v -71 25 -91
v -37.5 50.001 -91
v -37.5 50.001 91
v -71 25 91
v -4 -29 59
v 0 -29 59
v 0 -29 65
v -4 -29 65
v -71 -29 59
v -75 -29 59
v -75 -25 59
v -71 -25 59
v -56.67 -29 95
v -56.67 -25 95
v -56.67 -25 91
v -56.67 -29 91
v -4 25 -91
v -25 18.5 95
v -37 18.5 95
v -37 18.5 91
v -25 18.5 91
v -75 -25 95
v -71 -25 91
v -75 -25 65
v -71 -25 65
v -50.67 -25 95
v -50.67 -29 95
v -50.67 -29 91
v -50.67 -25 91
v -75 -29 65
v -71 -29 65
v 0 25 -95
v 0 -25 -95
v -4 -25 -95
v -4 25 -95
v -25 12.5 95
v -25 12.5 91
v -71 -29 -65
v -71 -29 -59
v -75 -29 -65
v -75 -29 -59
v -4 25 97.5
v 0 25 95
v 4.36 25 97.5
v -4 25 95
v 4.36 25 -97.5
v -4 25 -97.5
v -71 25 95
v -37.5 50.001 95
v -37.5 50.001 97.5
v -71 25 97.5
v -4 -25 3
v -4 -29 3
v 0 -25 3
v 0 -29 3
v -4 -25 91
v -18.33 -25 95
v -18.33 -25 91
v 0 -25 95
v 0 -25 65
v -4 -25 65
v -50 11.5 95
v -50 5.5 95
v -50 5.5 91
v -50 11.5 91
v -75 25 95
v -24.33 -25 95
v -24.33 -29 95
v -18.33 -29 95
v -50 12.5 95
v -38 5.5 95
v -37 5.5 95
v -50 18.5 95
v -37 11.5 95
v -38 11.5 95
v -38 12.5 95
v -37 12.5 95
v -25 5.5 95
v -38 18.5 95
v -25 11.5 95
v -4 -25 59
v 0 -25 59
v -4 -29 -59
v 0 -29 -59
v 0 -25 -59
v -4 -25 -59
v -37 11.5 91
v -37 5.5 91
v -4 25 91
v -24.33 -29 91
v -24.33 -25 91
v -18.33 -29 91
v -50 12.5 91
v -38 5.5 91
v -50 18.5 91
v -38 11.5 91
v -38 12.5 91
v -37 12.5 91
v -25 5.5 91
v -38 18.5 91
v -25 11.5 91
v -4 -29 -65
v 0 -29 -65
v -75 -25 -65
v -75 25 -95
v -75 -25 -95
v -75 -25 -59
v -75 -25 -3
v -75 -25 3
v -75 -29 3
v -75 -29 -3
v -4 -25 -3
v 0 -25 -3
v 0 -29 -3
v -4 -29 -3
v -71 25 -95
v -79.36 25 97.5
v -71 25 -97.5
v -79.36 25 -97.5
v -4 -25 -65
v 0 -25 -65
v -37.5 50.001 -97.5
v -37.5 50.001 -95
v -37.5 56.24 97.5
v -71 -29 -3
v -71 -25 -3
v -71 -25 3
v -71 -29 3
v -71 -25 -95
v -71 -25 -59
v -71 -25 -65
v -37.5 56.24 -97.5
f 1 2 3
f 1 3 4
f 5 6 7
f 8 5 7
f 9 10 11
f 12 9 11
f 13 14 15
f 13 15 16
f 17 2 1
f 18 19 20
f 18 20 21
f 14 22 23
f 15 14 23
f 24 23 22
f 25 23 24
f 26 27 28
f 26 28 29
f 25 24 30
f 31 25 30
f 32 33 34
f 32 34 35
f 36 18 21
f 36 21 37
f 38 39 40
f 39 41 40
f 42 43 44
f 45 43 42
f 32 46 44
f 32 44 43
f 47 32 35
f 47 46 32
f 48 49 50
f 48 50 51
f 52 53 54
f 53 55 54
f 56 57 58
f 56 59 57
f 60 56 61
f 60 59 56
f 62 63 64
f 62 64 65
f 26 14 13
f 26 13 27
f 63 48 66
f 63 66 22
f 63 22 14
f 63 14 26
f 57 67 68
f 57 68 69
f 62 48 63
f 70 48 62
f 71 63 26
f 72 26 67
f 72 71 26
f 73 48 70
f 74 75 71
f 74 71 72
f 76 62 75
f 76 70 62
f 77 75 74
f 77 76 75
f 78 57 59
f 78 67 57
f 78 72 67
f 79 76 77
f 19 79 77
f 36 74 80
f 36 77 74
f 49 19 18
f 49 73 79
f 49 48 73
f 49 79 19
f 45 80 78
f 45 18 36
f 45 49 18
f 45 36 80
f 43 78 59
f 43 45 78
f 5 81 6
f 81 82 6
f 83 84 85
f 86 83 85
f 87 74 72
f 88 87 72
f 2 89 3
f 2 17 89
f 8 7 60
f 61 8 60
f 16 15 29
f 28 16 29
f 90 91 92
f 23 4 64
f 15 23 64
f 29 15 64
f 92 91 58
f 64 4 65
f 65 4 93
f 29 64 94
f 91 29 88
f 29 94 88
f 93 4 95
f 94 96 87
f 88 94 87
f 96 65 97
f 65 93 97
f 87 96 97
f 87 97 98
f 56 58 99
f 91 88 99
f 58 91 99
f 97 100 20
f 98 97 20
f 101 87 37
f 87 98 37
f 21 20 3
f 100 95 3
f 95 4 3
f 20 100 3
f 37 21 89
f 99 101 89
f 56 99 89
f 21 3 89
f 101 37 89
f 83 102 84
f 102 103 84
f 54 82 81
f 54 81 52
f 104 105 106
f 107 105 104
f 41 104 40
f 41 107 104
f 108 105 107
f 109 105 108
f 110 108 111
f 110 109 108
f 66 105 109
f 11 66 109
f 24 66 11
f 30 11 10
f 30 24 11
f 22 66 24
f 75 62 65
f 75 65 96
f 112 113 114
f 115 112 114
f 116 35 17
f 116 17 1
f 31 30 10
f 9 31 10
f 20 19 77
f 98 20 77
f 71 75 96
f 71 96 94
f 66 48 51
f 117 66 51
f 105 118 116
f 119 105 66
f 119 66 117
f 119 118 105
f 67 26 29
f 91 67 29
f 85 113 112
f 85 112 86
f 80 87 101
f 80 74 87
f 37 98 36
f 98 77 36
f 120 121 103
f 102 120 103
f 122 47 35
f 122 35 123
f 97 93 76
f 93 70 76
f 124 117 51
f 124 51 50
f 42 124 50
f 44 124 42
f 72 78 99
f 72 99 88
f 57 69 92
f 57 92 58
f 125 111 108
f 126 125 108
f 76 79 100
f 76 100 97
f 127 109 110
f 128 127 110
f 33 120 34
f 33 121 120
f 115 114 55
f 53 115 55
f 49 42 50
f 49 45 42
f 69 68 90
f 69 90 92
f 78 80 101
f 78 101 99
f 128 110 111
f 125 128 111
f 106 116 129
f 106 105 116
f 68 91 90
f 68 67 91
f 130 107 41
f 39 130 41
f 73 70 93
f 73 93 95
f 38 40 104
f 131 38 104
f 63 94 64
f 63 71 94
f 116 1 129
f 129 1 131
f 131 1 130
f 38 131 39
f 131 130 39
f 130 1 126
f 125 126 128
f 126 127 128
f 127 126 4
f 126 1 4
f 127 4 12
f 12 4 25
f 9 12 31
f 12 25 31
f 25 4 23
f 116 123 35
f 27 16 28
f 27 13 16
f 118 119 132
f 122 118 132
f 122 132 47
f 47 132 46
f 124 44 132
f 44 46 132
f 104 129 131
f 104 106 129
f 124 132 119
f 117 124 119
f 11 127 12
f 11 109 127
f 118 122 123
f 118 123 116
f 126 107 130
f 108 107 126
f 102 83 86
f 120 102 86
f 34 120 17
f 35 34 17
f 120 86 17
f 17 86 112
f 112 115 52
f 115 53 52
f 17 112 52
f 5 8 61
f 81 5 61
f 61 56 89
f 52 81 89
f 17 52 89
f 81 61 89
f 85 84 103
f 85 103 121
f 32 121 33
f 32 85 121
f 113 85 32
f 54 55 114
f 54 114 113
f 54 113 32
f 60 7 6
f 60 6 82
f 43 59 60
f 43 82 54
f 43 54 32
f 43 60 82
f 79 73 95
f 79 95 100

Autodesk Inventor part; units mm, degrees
ref_plane "XZ Plane" through (0, 0, 0) normal (0, 1, 0) x (-1, 0, 0)
ref_plane "XY Plane" through (0, 0, 0) normal (0, 0, 1) x (1, 0, 0)
sketch "Náčrt1" plane through (0, 0, 0) normal (1, 0, 0) x (0, 1, 0)
  line L0 (25, 95) -> (-25, 95)
  line L1 (-25, 95) -> (-25, -95)
  line L2 (-25, -95) -> (25, -95)
  line L3 (25, -95) -> (25, 95)
  line L4 (25, 95) -> (-25, -95) construction
  line L5 (-25, 95) -> (25, -95) construction
  line L6 (-25, -3) -> (-29, -3)
  line L7 (-29, -3) -> (-29, 3)
  line L8 (-29, 3) -> (-25, 3)
  line L9 (-25, 3) -> (-25, -3)
  line L10 (-25, -65) -> (-29, -65)
  line L11 (-29, -65) -> (-29, -59)
  line L12 (-29, -59) -> (-25, -59)
  line L13 (-25, -59) -> (-25, -65)
  line L14 (-25, 59) -> (-29, 59)
  line L15 (-29, 59) -> (-29, 65)
  line L16 (-29, 65) -> (-25, 65)
  line L17 (-25, 65) -> (-25, 59)
  line L18 (7.5, 95) -> (7.5, 85)
  line L19 (7.5, 85) -> (17.5, 85)
  line L20 (17.5, 85) -> (17.5, 95)
  line L21 (-3.3333, 95) -> (-3.3333, 85)
  line L22 (-3.3333, 85) -> (-13.3333, 85)
  line L23 (-13.3333, 85) -> (-13.3333, 95)
  point P0 (0, 0)
  point P1 (25, 0)
  point P2 (-25, 0)
  point P3 (-25, 0)
  point P4 (-27, 3)
  point P5 (-27, 59)
  point P6 (12.5, 85)
  point P7 (-8.3333, 85)
  dimension "d0" = 50
  dimension "d1" = 190
  dimension "d46" = 6
  dimension "d47" = 4
  dimension "d48" = 4
  dimension "d49" = 6
  dimension "d50" = 30
  dimension "d51" = 4
  dimension "d52" = 6
  dimension "d53" = 30
  dimension "d54" = 56
  dimension "d73" = 10
  dimension "d74" = 10
  dimension "d75" = 10
  dimension "d76" = 10
  dimension "d77" = 12.5
  dimension "d78" = 16.6667
extrude "Vysunutí1" add sketch "Náčrt1" against normal blind 4
sketch "Náčrt2" plane through (0, 0, 0) normal (0, 0, 1) x (1, 0, 0)
  line L0 (-4, -25) -> (-4, 25) projected
  line L1 (4.3597, 25) -> (-37.5, 56.2403)
  line L2 (4.3597, 25) -> (-4, 25)
  line L3 (-4, 25) -> (-37.5, 50.0013)
  line L4 (-37.5, 56.2403) -> (-37.5, 50.0013)
  line L5 (0, -25) -> (0, 25) projected
  point P0 (0, 0)
  dimension "d56" = 31.2403
  dimension "d57" = 33.5
  dimension "d65" = 5
extrude "Vysunutí3" add sketch "Náčrt2" along normal mid plane 195
ref_plane "Pracovní rovina2" through (-37.5, 0, 0) normal (1, 0, 0) x (0, 1, 0)
mirror "Zrcadlit2" about plane through (-37.5, 0, 0) normal (1, 0, 0) of "Vysunutí3", "Vysunutí1"
sketch "Náčrt4" plane through (-4, -25, 95) normal (0, 0, 1) x (1, 0, 0)
  line L0 (4, 0) -> (0, 0) projected
  line L1 (-67, 50) -> (0, 50)
  line L2 (0, 50) -> (0, 0)
  line L3 (0, 0) -> (-67, 0)
  line L4 (-67, 0) -> (-67, 50)
  line L5 (-46, 43.5) -> (-21, 43.5)
  line L6 (-21, 43.5) -> (-21, 30.5)
  line L7 (-21, 30.5) -> (-46, 30.5)
  line L8 (-46, 30.5) -> (-46, 43.5)
  line L9 (-46, 43.5) -> (-21, 30.5) construction
  line L10 (-21, 43.5) -> (-46, 30.5) construction
  line L11 (-33, 43.5) -> (-33, 30.5)
  line L12 (-34, 43.5) -> (-34, 30.5)
  line L13 (-46, 37.5) -> (-21, 37.5)
  line L14 (-46, 36.5) -> (-21, 36.5)
  point P0 (4, 25)
  point P1 (-33.5, 37)
  point P2 (-33.5, 50)
  point P3 (-34, 36.5)
  point P4 (-33, 36.5)
  point P5 (-33, 37.5)
  point P6 (-34, 37.5)
  dimension "d30" = 50
  dimension "d31" = 67
  dimension "d34" = 25
  dimension "d35" = 13
  dimension "d37" = 21
  dimension "d38" = 1
  dimension "d39" = 1
  dimension "d41" = 6
  dimension "d42" = 12
  dimension "d43" = 25
  dimension "d66" = 6.5
extrude "Vysunutí5" add sketch "Náčrt4" against normal blind 4 contours L1 L2 L3 L4 | L5 L12 L13 L8 | L5 L11 L13 L12 | L13 L12 L14 L8 | L5 L6 L13 L11 | L13 L11 L14 L12 | L14 L12 L7 L8 | L13 L6 L14 L11 | L14 L11 L7 L12 | L14 L6 L7 L11
extrude "Vysunutí6" cut sketch "Náčrt4" against normal blind 10 contours L5 L12 L13 L8 | L5 L6 L13 L11 | L14 L12 L7 L8 | L14 L6 L7 L11
sketch "Náčrt5" plane through (0, -25, -95) normal (0, 0, -1) x (-1, 0, 0)
  line L0 (4, 50) -> (37.5, 75.0013) projected
  line L1 (4, 50) -> (71, 50)
  line L2 (4, 50) -> (37.5, 75.0013)
  line L3 (37.5, 75.0013) -> (71, 50) projected
  line L4 (37.5, 75.0013) -> (71, 50)
  line L5 (71, 50) -> (37.5, 75.0013) projected
  point P0 (0, 25)
  dimension "d67" = 67
extrude "Vysunutí7" add sketch "Náčrt5" against normal blind 4
mirror "Zrcadlit4" about plane through (0, 0, 0) normal (0, 0, 1) of "Vysunutí7"
sketch "Náčrt6" plane through (0, -25, 95) normal (0, 0, 1) x (1, 0, 0)
  line L0 (-75, 0) -> (0, 0) projected
  line L1 (-56.67, 0) -> (-56.67, -4)
  line L2 (-56.67, -4) -> (-50.67, -4)
  line L3 (-50.67, -4) -> (-50.67, 0)
  line L4 (-50.67, 0) -> (-56.67, 0)
  line L5 (-24.33, 0) -> (-24.33, -4)
  line L6 (-24.33, -4) -> (-18.33, -4)
  line L7 (-18.33, -4) -> (-18.33, 0)
  line L8 (-18.33, 0) -> (-24.33, 0)
  point P0 (0, 25)
  point P1 (-18.33, 0)
  point P2 (-24.33, 0)
  point P3 (-50.67, 0)
  dimension "d79" = 6
  dimension "d80" = 6
  dimension "d81" = 4
  dimension "d82" = 18.33
  dimension "d83" = 18.33
extrude "Vysunutí8" add sketch "Náčrt6" against normal blind 4
properties part number "prvni navrh"
